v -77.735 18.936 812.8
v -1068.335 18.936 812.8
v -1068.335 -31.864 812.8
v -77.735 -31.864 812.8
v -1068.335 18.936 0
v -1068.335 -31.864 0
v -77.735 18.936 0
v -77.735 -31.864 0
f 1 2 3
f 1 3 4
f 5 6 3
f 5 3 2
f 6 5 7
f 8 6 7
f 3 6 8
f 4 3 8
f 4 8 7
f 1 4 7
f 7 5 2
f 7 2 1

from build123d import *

# Parameters (mm, degrees)
F0_W     = 1016
F0_H     = 50.8
F1_DEPTH = 812.8
F2_DEPTH = 12.7
F3_DEPTH = 12.7


with BuildPart() as f1:
    # F0 (on Top) → F1 (new body)
    with BuildSketch(Plane.XY):
        with Locations((-560.3347482085, -6.4642370403)):
            Rectangle(F0_W, F0_H)
    extrude(amount=F1_DEPTH)

    # F2 (cut): a face of the model
    f2_faces = [f1.faces().sort_by_distance(p)[0] for p in [
        (-52.3347482085, -6.4642370403, 406.4),
    ]]
    extrude(f2_faces, amount=-F2_DEPTH, mode=Mode.SUBTRACT)

    # F3 (cut): a face of the model
    f3_faces = [f1.faces().sort_by_distance(p)[0] for p in [
        (-65.0347482085, -6.4642370403, 406.4),
    ]]
    extrude(f3_faces, amount=-F3_DEPTH, mode=Mode.SUBTRACT)


solid = f1.part
